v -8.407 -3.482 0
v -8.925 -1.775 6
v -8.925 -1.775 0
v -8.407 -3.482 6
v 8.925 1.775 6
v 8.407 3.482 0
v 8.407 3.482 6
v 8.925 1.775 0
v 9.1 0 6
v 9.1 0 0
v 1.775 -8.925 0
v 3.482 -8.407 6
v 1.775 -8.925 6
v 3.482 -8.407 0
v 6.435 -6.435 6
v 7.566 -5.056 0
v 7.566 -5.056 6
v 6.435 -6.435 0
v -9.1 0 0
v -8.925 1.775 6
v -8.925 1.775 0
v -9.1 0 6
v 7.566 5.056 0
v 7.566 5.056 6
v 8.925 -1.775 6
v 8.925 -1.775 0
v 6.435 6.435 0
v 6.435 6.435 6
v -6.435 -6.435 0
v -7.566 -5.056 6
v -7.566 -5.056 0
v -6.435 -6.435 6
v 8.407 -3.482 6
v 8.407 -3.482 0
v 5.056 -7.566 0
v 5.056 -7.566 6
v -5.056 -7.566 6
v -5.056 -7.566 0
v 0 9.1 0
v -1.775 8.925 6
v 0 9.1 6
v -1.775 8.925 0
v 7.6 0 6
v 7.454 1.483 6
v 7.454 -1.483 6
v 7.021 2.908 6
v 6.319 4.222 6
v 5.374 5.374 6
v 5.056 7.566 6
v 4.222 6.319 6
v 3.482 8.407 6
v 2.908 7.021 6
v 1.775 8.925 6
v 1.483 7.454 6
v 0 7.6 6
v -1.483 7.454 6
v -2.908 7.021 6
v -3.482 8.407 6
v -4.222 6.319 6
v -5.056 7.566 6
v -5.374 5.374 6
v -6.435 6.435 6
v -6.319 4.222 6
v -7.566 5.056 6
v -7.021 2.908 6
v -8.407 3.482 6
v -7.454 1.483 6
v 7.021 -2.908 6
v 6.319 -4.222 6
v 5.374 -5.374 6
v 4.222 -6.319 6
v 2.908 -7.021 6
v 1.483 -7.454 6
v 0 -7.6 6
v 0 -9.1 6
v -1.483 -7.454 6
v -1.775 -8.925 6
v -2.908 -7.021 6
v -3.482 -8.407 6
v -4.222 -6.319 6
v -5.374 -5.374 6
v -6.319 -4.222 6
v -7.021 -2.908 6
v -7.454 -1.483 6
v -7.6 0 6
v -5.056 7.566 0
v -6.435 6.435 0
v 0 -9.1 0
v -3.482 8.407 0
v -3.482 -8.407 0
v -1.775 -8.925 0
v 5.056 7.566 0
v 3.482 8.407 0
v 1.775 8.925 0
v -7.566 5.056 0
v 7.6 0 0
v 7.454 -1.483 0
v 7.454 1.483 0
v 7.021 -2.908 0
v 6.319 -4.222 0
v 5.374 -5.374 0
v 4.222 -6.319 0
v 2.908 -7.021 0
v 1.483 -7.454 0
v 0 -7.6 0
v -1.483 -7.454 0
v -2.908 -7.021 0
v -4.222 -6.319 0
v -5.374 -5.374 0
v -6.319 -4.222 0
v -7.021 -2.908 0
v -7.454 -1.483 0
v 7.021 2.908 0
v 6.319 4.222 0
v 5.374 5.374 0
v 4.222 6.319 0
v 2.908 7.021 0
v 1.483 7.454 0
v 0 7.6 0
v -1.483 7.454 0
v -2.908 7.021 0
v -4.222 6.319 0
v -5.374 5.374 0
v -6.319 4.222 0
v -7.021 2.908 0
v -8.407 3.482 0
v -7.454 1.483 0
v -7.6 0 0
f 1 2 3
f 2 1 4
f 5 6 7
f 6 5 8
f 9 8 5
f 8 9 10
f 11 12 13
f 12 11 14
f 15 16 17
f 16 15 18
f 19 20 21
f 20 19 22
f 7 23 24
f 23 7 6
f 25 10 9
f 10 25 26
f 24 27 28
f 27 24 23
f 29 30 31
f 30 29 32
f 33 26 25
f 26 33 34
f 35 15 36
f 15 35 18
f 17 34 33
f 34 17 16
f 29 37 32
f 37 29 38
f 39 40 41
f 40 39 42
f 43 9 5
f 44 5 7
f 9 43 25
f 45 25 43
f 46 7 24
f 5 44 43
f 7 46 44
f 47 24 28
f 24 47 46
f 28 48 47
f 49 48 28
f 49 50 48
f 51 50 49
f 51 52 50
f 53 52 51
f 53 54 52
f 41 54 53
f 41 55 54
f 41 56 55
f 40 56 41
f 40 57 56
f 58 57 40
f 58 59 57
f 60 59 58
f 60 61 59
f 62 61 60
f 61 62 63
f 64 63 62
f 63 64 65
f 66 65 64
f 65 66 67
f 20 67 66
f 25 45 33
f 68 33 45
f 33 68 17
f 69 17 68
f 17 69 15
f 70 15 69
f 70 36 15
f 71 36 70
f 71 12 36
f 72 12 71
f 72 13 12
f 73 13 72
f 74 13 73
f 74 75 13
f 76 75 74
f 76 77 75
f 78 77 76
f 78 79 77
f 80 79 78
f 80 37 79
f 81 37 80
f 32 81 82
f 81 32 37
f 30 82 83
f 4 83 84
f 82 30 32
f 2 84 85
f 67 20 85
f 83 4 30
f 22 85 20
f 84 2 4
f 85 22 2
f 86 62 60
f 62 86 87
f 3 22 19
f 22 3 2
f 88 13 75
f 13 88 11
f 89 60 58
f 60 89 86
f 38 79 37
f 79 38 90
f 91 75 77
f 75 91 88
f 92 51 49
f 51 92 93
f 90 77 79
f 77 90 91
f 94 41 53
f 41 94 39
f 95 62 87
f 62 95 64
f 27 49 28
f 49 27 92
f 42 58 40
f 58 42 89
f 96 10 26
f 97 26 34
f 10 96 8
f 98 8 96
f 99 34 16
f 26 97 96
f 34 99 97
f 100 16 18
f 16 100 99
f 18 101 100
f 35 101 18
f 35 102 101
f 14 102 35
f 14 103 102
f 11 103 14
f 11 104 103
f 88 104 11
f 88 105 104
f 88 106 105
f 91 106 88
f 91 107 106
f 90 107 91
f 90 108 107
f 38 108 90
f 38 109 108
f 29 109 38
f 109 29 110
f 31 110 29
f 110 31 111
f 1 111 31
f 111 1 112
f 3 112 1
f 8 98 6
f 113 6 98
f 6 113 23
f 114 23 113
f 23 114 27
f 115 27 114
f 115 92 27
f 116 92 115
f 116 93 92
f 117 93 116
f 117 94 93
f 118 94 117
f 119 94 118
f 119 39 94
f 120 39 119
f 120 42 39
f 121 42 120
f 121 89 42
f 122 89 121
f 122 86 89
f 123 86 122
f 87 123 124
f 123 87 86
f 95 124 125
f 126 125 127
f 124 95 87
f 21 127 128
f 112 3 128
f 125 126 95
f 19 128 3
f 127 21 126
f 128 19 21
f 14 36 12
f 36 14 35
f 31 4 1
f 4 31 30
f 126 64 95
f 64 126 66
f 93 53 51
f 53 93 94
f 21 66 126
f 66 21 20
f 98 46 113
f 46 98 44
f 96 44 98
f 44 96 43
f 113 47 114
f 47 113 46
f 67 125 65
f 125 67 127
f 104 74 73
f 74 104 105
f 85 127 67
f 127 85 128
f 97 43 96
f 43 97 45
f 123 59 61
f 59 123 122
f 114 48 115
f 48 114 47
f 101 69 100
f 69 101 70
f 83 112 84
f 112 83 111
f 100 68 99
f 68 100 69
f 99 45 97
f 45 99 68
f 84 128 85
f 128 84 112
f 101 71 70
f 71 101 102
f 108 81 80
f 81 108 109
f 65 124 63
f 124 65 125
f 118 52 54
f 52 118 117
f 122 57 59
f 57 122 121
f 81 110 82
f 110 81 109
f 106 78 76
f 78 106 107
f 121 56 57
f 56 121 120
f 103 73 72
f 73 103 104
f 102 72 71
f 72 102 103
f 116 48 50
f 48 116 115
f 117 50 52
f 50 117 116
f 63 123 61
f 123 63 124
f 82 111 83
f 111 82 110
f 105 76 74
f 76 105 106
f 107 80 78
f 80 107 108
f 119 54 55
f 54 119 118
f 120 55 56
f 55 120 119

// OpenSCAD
$fn = 32;

// ----------------------------------------------------------------------
// Spacer sleeve: 18.2 / 15.2 x 6 mm
// ----------------------------------------------------------------------

// --- parameters (mm) ---
outer_d = 18.2;           // outside diameter
inner_d = 15.2;           // shaft bore
length = 6;               // sleeve length

module sleeve() {
  cylinder(h = length, d = outer_d);
}

difference() {
  sleeve();
  translate([0, 0, -1]) cylinder(h = length + 2, d = inner_d);
}
